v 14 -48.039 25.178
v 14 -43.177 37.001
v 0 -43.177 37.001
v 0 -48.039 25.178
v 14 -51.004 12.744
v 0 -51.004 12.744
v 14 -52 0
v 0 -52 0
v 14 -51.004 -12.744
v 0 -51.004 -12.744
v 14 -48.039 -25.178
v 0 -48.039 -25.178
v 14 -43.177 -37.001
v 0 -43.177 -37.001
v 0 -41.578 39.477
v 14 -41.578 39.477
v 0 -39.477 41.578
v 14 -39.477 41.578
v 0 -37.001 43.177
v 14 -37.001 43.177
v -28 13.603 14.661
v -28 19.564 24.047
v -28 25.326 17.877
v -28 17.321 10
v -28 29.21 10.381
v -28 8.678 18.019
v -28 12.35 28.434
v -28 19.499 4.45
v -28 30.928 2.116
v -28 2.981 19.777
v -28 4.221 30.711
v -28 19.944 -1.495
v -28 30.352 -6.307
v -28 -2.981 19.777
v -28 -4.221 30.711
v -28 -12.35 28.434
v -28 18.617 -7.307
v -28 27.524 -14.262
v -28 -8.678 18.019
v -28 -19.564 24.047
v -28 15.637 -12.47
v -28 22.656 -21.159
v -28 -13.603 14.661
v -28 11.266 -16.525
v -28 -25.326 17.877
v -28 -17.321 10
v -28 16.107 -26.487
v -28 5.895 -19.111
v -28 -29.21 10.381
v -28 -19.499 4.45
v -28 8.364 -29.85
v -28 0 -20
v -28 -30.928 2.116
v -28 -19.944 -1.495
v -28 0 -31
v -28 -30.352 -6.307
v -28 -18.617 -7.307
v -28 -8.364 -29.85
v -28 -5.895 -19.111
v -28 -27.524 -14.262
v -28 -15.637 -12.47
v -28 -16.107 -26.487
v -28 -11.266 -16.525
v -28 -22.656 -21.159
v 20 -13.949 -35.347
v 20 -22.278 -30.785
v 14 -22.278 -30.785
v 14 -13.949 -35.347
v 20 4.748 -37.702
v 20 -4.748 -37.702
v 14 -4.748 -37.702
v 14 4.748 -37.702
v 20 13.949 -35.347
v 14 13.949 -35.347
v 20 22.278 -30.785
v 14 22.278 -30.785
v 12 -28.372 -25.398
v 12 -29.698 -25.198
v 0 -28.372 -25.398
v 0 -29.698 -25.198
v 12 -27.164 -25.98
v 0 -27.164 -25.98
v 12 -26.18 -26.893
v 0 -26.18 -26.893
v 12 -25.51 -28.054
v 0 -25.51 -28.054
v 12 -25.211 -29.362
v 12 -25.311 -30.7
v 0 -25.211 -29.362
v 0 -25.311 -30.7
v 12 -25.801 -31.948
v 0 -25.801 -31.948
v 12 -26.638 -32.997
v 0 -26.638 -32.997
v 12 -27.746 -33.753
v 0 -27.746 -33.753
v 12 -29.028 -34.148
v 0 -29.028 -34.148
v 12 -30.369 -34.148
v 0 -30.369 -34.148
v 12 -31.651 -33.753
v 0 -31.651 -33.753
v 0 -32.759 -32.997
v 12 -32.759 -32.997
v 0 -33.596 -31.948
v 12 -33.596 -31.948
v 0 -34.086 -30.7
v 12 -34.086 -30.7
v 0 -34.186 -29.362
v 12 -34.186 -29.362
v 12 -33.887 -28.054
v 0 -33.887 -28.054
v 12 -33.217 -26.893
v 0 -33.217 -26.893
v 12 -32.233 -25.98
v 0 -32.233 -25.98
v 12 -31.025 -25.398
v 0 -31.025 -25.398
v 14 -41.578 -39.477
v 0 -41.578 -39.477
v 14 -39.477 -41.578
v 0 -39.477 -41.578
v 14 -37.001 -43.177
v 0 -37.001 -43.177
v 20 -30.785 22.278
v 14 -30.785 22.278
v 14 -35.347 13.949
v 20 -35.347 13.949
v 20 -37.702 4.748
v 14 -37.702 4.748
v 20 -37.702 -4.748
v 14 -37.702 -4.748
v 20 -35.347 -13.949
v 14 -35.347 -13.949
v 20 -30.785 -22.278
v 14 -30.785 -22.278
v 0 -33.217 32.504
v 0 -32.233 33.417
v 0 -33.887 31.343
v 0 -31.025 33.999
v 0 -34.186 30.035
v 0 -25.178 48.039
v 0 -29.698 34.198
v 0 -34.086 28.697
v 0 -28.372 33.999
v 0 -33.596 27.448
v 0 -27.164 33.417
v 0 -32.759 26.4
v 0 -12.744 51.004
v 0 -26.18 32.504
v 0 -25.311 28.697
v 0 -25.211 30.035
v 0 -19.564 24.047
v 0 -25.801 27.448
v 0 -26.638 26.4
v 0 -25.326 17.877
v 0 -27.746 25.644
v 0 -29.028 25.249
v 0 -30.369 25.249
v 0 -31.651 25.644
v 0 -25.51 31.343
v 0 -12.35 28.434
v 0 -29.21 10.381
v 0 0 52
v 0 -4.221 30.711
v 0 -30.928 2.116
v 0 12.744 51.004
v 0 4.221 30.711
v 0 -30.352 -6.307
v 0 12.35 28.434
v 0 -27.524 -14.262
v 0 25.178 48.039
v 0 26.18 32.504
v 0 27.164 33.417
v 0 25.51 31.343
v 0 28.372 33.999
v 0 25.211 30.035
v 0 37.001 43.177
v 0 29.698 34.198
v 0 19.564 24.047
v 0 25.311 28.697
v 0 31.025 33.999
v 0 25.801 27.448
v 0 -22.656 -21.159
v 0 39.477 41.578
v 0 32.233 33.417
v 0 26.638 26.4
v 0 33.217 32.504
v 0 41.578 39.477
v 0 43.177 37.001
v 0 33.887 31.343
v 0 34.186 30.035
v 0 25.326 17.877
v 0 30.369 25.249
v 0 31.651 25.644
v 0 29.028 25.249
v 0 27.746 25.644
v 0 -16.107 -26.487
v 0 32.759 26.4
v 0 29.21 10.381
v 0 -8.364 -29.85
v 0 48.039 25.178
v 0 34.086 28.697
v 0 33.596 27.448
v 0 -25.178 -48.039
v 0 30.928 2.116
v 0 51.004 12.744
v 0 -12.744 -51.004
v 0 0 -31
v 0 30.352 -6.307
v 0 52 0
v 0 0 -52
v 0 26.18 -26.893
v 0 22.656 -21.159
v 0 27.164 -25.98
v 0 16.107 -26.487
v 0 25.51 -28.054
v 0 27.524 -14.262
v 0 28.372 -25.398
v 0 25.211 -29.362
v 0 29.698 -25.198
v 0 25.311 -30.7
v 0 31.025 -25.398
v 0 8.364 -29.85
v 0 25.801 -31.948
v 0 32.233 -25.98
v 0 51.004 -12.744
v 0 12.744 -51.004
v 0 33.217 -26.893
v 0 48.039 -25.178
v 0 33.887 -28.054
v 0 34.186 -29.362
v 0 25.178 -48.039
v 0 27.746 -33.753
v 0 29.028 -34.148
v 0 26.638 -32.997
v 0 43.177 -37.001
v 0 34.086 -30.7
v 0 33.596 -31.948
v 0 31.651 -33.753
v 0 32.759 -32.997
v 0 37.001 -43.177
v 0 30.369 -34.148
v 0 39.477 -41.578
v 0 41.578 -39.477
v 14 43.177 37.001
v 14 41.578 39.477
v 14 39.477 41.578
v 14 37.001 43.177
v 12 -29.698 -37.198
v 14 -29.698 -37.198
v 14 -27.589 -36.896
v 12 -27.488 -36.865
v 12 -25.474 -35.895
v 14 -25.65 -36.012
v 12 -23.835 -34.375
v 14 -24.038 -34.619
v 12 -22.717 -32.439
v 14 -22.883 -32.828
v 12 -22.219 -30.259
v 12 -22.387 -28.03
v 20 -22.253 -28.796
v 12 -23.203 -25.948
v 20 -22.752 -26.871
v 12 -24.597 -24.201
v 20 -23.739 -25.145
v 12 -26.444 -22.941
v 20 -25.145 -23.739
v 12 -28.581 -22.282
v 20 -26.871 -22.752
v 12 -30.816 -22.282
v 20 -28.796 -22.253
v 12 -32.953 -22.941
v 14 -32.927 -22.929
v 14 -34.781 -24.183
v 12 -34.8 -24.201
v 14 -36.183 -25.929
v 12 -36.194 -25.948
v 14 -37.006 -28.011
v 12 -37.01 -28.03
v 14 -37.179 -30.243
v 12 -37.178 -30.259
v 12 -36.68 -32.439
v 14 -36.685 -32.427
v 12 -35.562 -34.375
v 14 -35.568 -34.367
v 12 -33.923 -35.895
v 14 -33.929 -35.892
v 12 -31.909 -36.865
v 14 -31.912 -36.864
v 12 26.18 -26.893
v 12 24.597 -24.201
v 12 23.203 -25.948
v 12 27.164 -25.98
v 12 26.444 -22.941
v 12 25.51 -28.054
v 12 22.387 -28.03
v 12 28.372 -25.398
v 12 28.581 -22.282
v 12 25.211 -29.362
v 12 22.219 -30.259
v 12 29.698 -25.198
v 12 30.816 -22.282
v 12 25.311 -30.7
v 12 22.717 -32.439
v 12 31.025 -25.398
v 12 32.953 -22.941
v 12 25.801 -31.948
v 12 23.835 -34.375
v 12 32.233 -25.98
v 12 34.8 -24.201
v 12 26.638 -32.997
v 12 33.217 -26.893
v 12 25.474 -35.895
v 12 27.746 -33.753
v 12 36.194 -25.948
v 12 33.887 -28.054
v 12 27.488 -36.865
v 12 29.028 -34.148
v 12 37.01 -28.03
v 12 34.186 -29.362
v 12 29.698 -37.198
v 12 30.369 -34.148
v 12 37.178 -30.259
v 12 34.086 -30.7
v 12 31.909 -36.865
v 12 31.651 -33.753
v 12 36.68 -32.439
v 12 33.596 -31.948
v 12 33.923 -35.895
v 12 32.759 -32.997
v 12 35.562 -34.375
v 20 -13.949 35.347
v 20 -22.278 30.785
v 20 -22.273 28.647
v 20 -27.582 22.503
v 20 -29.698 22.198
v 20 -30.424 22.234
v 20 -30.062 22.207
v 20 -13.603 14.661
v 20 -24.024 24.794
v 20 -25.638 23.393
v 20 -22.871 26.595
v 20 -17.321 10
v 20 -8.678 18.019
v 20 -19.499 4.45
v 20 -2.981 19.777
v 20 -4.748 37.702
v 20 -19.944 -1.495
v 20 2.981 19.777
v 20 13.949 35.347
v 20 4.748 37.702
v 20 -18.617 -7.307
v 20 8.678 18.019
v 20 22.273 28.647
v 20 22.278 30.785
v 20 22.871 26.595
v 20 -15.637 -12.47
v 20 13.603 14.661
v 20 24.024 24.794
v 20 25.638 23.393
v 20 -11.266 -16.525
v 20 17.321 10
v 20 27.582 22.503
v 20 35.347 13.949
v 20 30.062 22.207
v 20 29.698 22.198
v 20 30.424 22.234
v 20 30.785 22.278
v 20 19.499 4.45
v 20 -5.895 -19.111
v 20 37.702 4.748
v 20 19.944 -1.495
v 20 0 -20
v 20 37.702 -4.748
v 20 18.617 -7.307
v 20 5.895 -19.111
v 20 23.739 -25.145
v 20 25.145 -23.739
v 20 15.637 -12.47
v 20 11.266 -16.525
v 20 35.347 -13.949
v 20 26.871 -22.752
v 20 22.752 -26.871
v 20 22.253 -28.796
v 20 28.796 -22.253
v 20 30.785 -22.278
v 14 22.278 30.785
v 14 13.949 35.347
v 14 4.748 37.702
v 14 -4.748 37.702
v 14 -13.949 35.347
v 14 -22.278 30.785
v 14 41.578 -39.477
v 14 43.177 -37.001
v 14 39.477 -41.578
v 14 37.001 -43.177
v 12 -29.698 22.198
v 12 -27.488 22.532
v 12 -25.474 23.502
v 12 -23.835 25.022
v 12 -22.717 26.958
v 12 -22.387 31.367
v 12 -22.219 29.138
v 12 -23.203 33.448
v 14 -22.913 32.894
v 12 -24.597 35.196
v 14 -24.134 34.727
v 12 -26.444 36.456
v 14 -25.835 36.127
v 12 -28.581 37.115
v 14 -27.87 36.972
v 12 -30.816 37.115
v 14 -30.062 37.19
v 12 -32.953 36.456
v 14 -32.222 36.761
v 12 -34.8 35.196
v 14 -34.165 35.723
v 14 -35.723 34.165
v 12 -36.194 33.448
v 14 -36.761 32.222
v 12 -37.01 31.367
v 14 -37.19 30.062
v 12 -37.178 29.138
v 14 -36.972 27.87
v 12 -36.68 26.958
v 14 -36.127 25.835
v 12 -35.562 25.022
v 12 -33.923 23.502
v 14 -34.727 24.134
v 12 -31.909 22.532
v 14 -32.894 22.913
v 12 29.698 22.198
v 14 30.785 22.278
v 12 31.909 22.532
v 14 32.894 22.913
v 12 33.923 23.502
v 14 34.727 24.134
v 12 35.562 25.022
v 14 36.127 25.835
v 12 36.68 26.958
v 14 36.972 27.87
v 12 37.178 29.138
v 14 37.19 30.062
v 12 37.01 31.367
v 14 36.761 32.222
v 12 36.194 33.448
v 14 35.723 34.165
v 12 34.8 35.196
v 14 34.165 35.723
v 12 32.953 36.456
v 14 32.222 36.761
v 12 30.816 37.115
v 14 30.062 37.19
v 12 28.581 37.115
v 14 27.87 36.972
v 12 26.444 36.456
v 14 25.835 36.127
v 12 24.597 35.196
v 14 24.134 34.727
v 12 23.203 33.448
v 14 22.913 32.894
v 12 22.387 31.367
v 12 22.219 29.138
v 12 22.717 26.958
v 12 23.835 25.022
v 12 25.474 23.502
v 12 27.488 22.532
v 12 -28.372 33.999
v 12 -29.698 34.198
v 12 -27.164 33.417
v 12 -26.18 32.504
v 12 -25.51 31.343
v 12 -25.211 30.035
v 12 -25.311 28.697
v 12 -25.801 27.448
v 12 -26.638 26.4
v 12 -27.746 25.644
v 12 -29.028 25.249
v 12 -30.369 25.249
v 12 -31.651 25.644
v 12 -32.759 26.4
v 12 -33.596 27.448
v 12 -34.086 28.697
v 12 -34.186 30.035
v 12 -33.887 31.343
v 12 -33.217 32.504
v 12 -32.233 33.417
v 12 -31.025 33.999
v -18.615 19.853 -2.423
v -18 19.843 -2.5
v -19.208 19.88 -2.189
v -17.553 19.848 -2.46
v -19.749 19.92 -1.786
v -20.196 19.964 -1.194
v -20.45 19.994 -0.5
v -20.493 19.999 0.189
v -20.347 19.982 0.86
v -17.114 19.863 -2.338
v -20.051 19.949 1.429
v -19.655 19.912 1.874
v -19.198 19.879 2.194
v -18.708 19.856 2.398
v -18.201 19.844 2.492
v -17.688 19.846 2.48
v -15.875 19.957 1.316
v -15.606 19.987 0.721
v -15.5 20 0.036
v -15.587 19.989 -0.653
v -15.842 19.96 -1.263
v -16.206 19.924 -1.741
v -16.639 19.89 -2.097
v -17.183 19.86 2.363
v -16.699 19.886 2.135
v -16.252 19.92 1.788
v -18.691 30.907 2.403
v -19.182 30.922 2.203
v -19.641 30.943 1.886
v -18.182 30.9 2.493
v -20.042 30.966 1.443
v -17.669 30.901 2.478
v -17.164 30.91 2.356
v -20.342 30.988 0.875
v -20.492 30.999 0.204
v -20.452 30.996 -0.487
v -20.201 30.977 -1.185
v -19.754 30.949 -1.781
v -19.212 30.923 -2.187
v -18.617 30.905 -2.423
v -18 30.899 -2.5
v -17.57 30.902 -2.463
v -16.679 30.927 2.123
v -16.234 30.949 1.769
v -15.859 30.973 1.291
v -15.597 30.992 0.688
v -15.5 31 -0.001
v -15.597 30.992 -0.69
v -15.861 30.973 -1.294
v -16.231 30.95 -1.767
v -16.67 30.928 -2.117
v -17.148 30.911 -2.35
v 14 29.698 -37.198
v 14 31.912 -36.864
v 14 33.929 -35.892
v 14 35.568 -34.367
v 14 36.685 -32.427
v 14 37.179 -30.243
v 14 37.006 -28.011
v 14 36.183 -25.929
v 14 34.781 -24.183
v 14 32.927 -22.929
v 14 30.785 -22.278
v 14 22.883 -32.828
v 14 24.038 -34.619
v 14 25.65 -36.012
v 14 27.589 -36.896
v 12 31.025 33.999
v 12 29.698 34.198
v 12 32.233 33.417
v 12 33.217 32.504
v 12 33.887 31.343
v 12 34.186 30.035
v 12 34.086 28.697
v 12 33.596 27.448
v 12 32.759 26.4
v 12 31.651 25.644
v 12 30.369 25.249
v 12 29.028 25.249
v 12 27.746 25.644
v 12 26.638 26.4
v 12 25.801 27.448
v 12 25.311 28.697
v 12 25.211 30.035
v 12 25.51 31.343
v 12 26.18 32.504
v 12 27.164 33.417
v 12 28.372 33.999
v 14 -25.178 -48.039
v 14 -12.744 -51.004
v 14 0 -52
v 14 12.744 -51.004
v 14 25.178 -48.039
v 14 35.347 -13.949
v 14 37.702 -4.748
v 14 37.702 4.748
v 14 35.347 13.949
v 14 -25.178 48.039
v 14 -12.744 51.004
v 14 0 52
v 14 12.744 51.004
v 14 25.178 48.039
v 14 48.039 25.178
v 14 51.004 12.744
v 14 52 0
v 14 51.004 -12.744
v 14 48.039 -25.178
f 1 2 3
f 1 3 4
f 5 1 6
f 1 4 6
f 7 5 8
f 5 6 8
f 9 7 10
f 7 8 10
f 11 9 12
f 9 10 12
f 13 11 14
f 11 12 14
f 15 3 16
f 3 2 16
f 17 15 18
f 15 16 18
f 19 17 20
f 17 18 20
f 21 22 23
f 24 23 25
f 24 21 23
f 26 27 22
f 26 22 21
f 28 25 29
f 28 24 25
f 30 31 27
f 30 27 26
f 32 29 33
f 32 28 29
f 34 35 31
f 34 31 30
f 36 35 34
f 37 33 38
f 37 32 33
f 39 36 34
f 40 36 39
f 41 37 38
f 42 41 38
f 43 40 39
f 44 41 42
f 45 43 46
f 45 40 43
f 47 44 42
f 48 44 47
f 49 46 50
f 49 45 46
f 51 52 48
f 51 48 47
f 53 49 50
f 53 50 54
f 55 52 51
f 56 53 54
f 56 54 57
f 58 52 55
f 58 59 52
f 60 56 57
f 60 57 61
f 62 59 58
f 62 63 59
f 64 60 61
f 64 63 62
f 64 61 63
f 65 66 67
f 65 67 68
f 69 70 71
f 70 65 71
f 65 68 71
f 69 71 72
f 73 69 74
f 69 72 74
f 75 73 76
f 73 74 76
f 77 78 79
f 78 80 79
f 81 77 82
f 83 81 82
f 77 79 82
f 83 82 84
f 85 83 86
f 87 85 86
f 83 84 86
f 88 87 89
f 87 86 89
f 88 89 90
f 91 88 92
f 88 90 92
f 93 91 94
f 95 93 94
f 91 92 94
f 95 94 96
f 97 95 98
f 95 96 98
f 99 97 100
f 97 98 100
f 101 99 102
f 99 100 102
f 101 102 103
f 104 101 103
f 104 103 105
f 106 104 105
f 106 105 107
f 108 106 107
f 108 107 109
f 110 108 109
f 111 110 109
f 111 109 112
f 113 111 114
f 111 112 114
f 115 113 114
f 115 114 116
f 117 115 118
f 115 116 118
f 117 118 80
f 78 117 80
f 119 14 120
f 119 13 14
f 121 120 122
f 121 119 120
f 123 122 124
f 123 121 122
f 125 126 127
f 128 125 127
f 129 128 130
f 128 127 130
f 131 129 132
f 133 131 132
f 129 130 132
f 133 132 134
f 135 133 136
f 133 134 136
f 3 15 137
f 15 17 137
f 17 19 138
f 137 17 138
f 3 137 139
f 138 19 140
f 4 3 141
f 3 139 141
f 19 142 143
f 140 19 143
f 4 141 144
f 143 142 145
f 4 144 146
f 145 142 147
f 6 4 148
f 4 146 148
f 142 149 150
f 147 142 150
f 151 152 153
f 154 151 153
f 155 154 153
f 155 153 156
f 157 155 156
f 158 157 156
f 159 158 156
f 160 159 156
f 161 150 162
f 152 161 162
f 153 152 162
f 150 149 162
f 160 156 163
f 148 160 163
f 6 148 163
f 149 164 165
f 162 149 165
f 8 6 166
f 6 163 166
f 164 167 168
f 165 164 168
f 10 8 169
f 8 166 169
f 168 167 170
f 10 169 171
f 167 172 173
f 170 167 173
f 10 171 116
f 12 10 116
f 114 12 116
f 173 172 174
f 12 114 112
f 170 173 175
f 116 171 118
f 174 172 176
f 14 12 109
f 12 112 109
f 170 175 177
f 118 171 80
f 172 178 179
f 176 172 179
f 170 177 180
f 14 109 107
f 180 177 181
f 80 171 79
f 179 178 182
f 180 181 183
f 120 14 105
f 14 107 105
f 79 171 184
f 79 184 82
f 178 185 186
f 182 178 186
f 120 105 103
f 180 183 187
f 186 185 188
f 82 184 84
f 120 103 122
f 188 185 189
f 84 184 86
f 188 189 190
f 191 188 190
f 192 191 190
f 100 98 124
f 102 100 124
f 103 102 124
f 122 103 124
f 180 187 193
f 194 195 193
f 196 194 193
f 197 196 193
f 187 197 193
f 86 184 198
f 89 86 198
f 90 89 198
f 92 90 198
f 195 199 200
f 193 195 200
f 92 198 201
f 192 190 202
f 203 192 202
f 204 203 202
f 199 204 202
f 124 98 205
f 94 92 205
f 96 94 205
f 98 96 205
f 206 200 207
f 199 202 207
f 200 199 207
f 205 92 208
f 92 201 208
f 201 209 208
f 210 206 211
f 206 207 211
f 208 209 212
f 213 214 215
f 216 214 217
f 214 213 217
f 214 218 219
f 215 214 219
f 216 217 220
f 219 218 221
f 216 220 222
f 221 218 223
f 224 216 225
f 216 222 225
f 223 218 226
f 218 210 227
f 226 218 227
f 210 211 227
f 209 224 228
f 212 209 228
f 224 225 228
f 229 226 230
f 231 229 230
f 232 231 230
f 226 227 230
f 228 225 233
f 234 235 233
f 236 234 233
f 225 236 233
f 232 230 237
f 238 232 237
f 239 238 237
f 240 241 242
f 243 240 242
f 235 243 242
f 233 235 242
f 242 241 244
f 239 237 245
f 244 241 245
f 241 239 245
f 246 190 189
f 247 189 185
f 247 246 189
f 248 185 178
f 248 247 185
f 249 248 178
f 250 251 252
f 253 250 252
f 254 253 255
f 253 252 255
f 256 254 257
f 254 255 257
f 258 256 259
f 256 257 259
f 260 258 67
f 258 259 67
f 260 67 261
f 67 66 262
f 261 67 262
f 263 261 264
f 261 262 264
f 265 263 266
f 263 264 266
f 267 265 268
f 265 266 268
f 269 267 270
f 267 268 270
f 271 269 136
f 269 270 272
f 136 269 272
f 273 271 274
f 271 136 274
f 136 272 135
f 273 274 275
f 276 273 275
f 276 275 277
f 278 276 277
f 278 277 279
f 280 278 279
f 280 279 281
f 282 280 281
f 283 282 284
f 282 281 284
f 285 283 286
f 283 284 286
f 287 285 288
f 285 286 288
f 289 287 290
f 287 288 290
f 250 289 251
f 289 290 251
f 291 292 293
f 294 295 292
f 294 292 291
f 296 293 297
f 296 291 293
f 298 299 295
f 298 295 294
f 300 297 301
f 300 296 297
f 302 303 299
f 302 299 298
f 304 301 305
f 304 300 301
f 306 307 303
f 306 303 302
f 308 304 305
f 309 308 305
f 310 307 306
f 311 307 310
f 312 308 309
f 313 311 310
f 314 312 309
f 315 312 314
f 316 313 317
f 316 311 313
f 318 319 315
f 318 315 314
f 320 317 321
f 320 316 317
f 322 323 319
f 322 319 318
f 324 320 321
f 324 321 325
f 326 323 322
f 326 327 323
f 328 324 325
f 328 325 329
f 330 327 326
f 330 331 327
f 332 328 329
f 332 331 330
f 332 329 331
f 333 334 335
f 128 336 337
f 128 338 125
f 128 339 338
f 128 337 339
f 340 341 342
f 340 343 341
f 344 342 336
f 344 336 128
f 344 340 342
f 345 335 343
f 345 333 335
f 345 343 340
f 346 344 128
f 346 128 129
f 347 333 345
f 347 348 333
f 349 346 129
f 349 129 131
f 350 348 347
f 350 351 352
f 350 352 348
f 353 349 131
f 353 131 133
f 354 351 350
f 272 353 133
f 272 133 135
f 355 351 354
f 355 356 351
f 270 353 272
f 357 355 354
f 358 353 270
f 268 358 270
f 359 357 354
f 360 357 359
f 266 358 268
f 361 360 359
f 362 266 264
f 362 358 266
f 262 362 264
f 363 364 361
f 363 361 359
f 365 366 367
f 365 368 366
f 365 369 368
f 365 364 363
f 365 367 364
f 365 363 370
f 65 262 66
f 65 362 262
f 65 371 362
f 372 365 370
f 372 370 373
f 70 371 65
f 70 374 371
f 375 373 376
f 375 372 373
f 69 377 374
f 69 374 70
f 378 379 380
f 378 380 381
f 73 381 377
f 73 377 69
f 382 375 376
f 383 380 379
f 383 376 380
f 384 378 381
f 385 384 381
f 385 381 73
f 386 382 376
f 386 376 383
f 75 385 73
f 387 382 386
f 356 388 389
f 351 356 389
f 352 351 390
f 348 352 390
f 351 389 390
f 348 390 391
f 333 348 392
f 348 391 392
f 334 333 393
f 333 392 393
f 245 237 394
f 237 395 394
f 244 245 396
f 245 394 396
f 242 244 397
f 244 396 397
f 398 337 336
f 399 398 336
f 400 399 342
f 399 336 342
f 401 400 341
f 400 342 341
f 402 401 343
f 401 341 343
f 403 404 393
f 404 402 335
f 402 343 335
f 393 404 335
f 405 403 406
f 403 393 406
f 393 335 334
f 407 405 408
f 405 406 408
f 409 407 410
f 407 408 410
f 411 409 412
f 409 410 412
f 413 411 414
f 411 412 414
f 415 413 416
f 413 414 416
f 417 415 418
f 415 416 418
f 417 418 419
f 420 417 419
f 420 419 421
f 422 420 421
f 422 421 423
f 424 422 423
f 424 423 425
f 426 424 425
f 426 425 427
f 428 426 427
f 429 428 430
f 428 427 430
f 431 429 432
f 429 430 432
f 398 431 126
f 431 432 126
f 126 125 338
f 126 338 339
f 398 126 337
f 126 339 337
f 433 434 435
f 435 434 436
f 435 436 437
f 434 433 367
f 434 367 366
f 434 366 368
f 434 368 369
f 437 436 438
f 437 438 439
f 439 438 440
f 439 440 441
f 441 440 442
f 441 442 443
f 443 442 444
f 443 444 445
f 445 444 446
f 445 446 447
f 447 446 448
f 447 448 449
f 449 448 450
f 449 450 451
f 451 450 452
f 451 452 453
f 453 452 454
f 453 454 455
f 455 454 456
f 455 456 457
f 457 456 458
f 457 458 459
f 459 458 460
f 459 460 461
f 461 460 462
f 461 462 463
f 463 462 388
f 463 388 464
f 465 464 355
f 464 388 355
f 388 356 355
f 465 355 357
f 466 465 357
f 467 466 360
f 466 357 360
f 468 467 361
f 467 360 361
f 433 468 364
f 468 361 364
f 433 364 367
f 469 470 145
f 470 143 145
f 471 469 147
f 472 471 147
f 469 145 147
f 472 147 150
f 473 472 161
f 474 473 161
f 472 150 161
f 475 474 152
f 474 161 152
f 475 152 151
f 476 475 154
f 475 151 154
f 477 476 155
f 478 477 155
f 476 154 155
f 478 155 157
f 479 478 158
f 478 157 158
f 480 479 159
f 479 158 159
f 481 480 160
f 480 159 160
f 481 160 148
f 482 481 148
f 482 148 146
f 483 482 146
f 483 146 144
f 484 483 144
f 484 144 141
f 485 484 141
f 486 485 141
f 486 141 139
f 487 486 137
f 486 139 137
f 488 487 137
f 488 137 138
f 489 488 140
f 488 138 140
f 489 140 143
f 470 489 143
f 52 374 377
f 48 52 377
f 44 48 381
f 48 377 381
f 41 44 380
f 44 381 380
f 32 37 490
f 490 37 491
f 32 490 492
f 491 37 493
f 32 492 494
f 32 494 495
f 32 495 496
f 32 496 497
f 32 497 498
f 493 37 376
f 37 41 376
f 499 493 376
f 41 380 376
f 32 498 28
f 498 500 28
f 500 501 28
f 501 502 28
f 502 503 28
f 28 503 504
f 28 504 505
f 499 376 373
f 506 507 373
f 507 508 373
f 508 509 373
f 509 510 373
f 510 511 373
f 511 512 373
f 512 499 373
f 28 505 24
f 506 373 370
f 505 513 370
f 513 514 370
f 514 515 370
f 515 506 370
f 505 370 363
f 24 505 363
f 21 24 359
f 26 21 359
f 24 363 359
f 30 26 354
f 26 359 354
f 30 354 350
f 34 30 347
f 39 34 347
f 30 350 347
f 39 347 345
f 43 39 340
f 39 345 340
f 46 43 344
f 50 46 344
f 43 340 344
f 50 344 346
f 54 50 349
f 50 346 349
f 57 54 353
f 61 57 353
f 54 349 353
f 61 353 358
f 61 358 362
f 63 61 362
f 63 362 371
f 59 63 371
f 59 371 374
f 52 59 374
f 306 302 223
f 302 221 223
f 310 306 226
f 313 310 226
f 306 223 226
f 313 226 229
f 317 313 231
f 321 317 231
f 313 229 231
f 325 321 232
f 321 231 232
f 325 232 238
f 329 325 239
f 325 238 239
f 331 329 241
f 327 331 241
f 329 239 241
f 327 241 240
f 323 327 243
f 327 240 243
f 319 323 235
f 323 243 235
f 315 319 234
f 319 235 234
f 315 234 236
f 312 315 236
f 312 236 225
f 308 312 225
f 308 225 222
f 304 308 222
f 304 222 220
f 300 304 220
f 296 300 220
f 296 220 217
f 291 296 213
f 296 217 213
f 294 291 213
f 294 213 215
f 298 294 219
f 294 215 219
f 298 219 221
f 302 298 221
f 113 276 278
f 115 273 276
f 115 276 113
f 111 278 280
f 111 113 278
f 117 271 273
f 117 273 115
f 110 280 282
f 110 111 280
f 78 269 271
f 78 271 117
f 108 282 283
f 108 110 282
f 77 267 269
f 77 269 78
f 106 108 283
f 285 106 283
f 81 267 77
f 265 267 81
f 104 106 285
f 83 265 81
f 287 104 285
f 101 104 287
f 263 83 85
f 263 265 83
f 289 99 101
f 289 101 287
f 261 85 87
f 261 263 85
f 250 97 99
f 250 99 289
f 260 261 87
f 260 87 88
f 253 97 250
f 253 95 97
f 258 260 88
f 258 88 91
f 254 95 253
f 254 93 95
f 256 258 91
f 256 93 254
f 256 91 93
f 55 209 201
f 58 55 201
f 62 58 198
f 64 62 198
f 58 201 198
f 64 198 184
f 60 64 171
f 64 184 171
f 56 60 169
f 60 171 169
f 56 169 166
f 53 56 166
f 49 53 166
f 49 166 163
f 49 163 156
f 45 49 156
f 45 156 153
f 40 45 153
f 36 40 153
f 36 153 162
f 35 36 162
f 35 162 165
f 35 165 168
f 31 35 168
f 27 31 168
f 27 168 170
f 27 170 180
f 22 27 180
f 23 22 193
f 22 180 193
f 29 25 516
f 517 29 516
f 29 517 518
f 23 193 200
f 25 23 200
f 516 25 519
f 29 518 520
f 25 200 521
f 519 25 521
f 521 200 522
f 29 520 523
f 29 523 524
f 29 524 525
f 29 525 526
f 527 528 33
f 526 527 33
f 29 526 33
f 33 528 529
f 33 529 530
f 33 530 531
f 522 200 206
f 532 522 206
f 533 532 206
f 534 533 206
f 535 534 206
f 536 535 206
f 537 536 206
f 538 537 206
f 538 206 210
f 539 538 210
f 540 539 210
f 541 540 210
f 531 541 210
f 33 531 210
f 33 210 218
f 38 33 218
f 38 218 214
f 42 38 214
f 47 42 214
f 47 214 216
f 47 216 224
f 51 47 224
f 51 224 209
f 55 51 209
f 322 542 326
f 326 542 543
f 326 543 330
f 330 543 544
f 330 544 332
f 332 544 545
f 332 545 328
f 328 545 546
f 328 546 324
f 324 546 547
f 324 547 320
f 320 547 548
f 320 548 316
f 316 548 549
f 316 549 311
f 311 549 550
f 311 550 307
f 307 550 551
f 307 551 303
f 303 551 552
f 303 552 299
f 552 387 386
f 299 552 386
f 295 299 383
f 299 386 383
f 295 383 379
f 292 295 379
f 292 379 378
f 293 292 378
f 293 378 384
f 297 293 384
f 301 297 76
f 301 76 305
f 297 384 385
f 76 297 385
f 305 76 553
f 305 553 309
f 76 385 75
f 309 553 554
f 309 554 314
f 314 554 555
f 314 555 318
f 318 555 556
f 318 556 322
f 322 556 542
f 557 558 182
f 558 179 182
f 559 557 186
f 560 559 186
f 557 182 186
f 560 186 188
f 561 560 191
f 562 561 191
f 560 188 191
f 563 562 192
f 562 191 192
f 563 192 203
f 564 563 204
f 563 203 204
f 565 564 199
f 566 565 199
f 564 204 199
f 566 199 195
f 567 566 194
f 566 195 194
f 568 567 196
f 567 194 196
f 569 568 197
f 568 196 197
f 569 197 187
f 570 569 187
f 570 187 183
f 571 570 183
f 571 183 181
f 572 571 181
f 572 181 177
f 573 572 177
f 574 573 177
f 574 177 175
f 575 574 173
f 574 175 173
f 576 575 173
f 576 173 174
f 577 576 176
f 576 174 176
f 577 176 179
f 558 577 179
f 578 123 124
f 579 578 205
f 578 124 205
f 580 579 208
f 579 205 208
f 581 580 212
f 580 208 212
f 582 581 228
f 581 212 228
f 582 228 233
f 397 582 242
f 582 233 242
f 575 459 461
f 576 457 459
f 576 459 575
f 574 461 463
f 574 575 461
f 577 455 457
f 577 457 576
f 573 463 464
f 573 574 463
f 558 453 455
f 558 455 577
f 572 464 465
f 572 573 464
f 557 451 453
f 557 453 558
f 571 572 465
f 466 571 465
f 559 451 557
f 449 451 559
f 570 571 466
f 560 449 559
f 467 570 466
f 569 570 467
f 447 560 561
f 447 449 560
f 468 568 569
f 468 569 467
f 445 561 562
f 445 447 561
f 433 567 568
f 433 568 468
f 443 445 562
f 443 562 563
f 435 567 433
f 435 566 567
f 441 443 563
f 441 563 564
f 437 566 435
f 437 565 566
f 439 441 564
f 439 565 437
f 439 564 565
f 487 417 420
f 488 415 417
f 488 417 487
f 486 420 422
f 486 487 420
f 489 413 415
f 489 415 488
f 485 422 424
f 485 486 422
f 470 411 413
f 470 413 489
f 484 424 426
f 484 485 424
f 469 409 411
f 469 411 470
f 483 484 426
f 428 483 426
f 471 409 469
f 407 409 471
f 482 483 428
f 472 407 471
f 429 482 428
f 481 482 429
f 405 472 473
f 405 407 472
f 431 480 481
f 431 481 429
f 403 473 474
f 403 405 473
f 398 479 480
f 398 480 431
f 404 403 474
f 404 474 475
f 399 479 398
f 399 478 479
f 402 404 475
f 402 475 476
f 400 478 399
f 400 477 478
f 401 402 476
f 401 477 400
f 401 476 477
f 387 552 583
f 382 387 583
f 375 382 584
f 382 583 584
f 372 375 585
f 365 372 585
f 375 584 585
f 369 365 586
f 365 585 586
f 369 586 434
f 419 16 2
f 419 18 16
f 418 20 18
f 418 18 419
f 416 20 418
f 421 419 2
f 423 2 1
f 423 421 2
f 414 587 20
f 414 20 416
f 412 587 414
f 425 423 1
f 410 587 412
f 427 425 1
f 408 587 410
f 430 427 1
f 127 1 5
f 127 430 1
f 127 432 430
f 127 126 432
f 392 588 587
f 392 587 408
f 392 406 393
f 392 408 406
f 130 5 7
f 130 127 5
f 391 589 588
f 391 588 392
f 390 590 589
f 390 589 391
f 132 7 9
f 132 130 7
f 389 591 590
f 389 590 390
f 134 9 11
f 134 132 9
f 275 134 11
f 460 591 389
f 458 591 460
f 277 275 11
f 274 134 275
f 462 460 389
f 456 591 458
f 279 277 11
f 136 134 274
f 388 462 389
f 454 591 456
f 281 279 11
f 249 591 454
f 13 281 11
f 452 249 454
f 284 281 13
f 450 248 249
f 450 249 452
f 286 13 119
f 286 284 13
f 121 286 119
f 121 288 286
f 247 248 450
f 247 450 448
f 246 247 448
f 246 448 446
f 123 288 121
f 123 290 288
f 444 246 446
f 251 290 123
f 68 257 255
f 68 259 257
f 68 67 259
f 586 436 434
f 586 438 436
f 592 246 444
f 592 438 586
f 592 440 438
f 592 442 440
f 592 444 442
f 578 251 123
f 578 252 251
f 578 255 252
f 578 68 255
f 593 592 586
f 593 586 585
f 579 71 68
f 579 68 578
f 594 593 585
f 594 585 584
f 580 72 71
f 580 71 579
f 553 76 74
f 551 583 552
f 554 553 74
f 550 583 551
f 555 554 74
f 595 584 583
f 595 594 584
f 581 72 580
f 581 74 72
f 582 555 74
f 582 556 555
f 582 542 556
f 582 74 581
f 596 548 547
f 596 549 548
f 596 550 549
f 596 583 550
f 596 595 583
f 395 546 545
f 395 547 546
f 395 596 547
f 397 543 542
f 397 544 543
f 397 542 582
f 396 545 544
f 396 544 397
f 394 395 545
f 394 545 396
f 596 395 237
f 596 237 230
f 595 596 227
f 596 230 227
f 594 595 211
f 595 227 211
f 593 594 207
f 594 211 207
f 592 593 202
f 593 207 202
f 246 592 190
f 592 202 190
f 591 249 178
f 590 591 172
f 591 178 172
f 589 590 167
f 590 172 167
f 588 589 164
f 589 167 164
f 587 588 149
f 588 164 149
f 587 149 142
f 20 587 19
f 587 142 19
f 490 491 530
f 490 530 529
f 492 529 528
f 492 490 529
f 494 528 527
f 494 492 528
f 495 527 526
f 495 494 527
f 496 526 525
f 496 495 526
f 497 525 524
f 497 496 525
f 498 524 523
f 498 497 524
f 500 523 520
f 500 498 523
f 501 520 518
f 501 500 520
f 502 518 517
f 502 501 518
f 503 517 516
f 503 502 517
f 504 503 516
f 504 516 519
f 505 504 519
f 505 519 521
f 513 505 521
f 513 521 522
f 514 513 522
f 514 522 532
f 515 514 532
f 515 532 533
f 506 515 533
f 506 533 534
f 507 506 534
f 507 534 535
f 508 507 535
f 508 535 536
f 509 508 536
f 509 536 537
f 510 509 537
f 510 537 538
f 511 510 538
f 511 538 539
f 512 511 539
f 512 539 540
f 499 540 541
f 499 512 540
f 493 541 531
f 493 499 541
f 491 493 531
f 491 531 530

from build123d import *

# Parameters (mm, degrees)
EXTRUDE_1_DEPTH              = 14
SKETCH_2_R                   = 38
EXTRUDE_2_DEPTH              = 6
SKETCH_3_R                   = 31
EXTRUDE_3_DEPTH              = 28
SKETCH_4_R                   = 20
CUT_EXTRUDE_4_DEPTH          = 88.8179936
SKETCH_5_R                   = 2.5
CUT_EXTRUDE_5_DEPTH          = 79.689262292
HOLE_WIZARD_M8_1_D           = 9
HOLE_WIZARD_M8_1_CBORE_D     = 15
HOLE_WIZARD_M8_1_CBORE_DEPTH = 8
FILLET_1_R                   = 14


with BuildPart() as part:
    # 草圖1 → 伸長1 (new body)
    with BuildSketch(Plane(origin=(0, 0, 0), x_dir=(0, 0, -1), z_dir=(1, 0, 0))):
        with BuildLine():
            ThreePointArc((41.00892786, 41.00892786), (0, 52), (-41.00892786, 41.00892786))
            ThreePointArc((-41.00892786, 41.00892786), (-52, 0), (-41.00892786, -41.00892786))
            ThreePointArc((-41.00892786, -41.00892786), (0, -52), (41.00892786, -41.00892786))
            ThreePointArc((41.00892786, -41.00892786), (52, 0), (41.00892786, 41.00892786))
        make_face()
    extrude(amount=EXTRUDE_1_DEPTH)

    # 草圖2 → 伸長2 (add)
    with BuildSketch(Plane(origin=(14, 0, 0), x_dir=(0, 0, -1), z_dir=(1, 0, 0))):
        Circle(SKETCH_2_R)
    extrude(amount=EXTRUDE_2_DEPTH)

    # 草圖3 → 伸長3 (add)
    with BuildSketch(Plane.ZY):
        with Locations(Location((0, 0, 0), (0, 0, 180))):
            Circle(SKETCH_3_R)
    extrude(amount=EXTRUDE_3_DEPTH)

    # 草圖4 → 伸長4 (cut, through all)
    with BuildSketch(Plane(origin=(20, 0, 0), x_dir=(0, 0, -1), z_dir=(1, 0, 0))):
        Circle(SKETCH_4_R)
    extrude(amount=-CUT_EXTRUDE_4_DEPTH, mode=Mode.SUBTRACT)

    # 草圖5 → 伸長5 (cut, through all)
    with BuildSketch(Plane(origin=(0, 0, 0), x_dir=(1, 0, 0), z_dir=(0, 1, 0))):
        with Locations(Location((-18, 0, 0), (0, 0, 90))):
            Circle(SKETCH_5_R)
    extrude(amount=CUT_EXTRUDE_5_DEPTH, mode=Mode.SUBTRACT)

    # M8 六角承窩頭蓋螺釘的柱孔1 (through all)
    with Locations(Plane(origin=(20, 0, 0), x_dir=(0, 0, -1), z_dir=(1, 0, 0))):
        with Locations((29.69848481, 29.69848481), (29.69848481, -29.69848481), (-29.69848481, 29.69848481), (-29.69848481, -29.69848481)):
            CounterBoreHole(HOLE_WIZARD_M8_1_D / 2, HOLE_WIZARD_M8_1_CBORE_D / 2, HOLE_WIZARD_M8_1_CBORE_DEPTH)

    # 圓角1
    fillet_1_edges = [part.edges().sort_by_distance(p)[0] for p in [
        (7, 41.00892786, 41.00892786),
        (7, 41.00892786, -41.00892786),
        (7, -41.00892786, -41.00892786),
        (7, -41.00892786, 41.00892786),
    ]]
    fillet(fillet_1_edges, radius=FILLET_1_R)


solid = part.part
